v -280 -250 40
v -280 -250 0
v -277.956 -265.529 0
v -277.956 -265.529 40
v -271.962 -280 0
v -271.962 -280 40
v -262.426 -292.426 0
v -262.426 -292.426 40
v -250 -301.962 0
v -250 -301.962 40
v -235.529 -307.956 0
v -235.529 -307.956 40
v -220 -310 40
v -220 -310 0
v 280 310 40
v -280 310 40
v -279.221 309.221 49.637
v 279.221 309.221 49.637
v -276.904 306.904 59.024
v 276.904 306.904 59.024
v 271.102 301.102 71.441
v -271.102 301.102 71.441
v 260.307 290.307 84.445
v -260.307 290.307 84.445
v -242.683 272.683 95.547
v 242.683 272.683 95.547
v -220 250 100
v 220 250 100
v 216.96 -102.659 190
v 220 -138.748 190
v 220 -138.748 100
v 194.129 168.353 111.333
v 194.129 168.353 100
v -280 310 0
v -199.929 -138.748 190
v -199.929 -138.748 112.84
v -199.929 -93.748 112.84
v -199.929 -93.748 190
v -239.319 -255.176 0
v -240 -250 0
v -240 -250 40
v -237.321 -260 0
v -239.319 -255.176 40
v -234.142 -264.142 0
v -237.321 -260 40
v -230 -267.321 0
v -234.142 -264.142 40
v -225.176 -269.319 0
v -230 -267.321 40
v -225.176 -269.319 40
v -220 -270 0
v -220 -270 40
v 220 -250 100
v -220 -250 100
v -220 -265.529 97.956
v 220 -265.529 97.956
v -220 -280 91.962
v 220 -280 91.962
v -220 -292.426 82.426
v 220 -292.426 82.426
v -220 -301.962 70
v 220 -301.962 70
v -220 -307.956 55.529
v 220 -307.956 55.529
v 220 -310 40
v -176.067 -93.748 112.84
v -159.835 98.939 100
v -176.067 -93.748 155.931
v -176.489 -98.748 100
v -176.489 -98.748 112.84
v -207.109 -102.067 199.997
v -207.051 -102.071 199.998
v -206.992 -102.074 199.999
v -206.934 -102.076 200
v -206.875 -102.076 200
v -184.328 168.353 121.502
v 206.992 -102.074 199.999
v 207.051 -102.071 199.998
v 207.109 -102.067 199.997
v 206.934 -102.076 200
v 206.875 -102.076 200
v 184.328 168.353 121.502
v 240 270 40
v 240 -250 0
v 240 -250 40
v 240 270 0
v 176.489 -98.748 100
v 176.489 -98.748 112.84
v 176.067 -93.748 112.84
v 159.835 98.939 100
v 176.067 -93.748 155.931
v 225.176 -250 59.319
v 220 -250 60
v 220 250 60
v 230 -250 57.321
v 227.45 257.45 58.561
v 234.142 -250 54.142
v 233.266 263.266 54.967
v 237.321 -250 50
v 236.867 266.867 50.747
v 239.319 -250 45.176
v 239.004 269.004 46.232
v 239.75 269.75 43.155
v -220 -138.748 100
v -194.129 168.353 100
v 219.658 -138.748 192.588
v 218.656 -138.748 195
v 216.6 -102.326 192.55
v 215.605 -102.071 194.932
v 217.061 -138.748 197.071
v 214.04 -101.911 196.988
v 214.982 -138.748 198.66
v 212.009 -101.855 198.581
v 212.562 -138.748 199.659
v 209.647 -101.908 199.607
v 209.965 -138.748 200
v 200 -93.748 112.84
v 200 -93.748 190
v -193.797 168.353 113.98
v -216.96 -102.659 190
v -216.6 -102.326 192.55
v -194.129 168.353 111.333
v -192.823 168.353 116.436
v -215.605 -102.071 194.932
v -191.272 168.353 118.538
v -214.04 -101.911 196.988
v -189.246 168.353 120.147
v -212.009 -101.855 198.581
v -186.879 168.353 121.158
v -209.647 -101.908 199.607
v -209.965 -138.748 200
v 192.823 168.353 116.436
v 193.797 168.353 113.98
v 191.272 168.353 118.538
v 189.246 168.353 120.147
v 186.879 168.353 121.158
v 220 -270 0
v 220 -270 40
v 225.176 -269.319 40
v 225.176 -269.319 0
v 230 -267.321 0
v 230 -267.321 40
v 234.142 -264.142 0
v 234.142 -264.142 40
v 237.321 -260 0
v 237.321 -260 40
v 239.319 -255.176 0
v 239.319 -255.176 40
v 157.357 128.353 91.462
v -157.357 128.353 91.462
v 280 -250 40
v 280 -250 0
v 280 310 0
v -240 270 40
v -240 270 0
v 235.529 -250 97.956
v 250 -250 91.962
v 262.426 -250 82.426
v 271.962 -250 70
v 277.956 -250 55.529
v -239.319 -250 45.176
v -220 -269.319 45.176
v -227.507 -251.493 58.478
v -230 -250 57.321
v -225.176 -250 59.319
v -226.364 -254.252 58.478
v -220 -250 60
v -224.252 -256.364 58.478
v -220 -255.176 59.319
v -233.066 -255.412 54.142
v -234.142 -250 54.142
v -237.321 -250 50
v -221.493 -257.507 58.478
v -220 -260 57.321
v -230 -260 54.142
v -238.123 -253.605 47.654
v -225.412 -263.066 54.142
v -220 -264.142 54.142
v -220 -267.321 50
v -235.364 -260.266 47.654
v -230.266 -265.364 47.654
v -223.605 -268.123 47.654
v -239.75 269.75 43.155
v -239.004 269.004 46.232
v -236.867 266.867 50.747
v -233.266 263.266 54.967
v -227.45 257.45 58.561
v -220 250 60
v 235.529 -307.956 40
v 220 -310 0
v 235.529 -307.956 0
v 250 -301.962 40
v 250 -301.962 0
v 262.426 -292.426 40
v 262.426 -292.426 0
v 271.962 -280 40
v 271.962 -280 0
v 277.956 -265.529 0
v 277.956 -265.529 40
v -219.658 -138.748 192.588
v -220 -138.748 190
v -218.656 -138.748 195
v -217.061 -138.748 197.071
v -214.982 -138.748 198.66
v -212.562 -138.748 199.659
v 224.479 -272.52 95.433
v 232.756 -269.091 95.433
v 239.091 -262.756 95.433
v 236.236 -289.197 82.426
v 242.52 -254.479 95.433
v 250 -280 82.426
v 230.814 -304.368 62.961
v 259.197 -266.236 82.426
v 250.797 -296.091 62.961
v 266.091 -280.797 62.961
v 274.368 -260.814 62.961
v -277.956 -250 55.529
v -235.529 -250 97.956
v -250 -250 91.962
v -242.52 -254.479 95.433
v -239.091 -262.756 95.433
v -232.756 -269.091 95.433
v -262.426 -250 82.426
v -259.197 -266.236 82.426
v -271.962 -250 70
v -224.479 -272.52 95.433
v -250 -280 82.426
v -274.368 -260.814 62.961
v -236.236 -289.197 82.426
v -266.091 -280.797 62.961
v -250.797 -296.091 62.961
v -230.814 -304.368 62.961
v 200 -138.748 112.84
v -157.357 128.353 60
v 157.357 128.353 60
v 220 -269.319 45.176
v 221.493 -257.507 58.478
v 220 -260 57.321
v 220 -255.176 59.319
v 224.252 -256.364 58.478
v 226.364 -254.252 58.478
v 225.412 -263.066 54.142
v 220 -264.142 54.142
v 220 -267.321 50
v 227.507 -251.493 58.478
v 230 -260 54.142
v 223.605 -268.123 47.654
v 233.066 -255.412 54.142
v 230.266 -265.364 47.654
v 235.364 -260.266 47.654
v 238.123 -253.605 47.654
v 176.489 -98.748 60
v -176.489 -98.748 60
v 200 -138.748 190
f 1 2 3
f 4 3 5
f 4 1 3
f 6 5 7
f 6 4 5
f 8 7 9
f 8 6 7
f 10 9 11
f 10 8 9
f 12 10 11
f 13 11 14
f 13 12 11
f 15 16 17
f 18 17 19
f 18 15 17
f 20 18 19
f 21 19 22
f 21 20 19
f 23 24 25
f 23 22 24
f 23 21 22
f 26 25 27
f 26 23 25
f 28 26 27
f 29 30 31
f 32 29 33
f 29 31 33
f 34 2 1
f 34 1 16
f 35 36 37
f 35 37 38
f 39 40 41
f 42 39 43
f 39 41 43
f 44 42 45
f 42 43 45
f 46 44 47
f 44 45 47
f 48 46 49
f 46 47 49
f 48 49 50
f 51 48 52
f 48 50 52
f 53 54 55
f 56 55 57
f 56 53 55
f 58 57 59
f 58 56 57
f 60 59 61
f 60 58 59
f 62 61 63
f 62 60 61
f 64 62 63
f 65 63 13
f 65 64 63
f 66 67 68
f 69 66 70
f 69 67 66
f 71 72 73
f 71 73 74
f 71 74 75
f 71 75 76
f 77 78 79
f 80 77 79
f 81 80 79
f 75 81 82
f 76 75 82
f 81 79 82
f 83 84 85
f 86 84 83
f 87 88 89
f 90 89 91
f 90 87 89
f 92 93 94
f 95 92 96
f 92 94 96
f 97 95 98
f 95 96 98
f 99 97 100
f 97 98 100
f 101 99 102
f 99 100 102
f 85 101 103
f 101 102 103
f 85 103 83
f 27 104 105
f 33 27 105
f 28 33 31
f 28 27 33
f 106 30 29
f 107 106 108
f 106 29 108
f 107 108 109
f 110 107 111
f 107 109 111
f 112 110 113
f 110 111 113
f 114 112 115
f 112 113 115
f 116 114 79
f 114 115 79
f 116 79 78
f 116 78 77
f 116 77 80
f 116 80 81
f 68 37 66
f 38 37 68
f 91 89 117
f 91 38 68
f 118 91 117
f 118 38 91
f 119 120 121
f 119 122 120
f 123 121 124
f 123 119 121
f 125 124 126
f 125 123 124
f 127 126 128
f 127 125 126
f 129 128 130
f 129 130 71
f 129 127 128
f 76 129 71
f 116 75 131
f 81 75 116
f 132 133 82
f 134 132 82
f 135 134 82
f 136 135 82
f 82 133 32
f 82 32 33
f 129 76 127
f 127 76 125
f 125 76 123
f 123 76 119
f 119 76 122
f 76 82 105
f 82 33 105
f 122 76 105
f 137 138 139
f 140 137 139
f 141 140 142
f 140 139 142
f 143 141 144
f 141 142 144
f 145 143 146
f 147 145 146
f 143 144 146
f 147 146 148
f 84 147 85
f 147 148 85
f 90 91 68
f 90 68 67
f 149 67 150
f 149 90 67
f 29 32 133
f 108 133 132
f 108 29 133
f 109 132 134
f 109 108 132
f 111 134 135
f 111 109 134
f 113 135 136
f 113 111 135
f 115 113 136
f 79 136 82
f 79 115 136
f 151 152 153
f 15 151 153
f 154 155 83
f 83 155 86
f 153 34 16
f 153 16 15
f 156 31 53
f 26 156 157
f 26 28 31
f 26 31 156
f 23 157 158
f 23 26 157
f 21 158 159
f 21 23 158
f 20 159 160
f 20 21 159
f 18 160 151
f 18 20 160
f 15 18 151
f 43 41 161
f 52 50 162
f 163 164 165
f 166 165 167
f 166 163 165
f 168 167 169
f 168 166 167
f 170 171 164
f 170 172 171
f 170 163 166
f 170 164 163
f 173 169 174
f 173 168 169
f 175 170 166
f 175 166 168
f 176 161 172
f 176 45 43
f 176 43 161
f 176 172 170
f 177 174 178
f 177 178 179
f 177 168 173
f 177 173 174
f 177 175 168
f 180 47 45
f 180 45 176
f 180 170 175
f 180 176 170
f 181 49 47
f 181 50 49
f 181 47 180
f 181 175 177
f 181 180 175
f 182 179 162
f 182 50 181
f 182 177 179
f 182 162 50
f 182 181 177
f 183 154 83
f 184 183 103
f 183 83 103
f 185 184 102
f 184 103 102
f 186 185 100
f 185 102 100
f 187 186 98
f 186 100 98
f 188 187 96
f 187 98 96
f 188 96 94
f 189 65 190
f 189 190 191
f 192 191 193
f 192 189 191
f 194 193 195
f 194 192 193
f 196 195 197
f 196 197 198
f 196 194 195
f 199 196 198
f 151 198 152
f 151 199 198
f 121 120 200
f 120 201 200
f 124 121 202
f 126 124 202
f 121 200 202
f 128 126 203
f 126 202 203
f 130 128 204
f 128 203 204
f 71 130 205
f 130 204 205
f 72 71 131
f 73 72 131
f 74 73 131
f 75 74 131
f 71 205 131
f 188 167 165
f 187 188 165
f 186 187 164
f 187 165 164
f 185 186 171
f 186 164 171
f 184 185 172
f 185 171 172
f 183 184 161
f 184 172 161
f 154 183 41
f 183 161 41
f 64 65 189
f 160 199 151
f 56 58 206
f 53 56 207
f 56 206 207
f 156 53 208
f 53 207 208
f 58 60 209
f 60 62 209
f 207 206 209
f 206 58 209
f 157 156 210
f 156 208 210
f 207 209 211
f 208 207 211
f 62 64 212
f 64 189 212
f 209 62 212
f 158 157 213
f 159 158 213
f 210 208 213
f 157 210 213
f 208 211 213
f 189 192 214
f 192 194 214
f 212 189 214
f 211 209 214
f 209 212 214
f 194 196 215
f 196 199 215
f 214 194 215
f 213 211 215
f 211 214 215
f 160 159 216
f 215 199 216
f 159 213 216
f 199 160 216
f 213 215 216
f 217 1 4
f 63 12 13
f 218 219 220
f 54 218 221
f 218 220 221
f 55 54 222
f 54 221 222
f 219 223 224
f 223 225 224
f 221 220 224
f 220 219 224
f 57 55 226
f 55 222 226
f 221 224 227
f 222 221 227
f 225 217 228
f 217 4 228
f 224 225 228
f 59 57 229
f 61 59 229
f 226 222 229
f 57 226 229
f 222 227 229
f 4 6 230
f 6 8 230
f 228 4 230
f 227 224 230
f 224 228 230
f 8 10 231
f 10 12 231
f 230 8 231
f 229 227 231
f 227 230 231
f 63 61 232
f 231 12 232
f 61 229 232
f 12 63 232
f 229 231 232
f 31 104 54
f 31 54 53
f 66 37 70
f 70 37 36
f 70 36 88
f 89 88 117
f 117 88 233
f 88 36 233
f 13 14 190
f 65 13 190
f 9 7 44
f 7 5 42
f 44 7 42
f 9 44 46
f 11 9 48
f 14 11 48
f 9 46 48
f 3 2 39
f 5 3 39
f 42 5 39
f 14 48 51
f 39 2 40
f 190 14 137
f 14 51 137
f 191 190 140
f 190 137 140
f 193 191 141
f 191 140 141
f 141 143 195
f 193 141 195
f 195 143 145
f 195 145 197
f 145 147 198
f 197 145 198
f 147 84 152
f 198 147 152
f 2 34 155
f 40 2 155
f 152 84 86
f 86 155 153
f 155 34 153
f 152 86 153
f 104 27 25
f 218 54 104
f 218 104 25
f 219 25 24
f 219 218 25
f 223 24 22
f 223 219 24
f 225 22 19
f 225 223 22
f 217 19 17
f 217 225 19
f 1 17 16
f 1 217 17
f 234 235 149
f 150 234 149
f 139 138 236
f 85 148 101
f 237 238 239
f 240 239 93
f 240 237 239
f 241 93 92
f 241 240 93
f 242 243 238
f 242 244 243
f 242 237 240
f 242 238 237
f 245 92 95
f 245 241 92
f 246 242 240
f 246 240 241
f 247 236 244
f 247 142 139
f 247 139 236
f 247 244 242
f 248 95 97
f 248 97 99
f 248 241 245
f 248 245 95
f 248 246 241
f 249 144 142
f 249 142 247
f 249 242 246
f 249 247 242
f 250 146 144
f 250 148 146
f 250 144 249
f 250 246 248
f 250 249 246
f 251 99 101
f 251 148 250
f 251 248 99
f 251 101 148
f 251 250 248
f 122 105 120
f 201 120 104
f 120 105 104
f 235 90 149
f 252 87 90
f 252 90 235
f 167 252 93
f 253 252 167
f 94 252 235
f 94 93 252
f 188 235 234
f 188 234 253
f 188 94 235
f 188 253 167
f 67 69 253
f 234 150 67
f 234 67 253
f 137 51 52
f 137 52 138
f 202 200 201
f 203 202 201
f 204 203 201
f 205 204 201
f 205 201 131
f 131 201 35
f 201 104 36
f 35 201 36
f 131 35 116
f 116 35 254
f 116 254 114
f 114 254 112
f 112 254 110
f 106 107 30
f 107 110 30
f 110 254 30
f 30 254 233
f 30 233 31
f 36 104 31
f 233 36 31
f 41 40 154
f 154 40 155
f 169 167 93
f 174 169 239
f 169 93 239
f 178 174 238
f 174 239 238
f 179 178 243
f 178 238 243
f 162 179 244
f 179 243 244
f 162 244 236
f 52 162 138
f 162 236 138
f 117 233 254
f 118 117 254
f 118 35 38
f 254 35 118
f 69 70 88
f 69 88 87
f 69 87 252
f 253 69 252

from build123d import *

# Parameters (mm, degrees)
F0_W         = 560
F0_H         = 620
F1_DEPTH     = 100
F2_R         = 60
F3_R         = 60
F5_DEPTH     = 100
F7_DEPTH     = 560.001
F8_R         = 10
F10_T        = 40
F10_T3_DEPTH = 520
F10_T5_DEPTH = 388.1889053137
F10_T7_DEPTH = 388.1889053137
F10_T9_DEPTH = 468.2577419281
F9_W         = 399.9291565789
F9_H         = 77.1599882841
F11_DEPTH    = 45


# Not quite as in the source:
# - a shell that OpenCascade refuses in one call is made with other operations: the cavity is built on its own and cut out


with BuildPart() as f1:
    # F0 (on Top) → F1 (new body)
    with BuildSketch(Plane.XY):
        Rectangle(F0_W, F0_H)
    extrude(amount=F1_DEPTH)

    # F2
    f2_edges = [f1.edges().sort_by_distance(p)[0] for p in [
        (280, -310, 50),
        (-280, -310, 50),
    ]]
    fillet(f2_edges, radius=F2_R)

    # F3
    f3_edges = [f1.edges().sort_by_distance(p)[0] for p in [
        (0, -310, 100),
        (-262.426407, -292.426407, 100),
        (262.426407, -292.426407, 100),
        (-280, 30, 100),
        (280, 30, 100),
        (0, 310, 100),
    ]]
    fillet(f3_edges, radius=F3_R)

    # F4 (on face) → F5 (join)
    with BuildSketch(Plane.XY.offset(100)):
        Polygon((-194.1288709641, 168.3533191681), (-220, -138.7477815151), (0, -138.7477815151), (220, -138.7477815151), (194.1288709641, 168.3533191681), (0, 168.3533191681), align=None)
    extrude(amount=F5_DEPTH)

    # F6 (on face) → F7 (cut, through all)
    with BuildSketch(Plane.YZ.offset(280)):
        Polygon((261.031751243, 237.4019711016), (-149.0081892093, 213.623028462), (222.8016257286, 105.6972444057), align=None)
    extrude(amount=-F7_DEPTH, mode=Mode.SUBTRACT)

    # F8
    f8_edges = [f1.edges().sort_by_distance(p)[0] for p in [
        (218.455336, -120.411972, 200),
        (205.519771, 33.138578, 160.751017),
        (-218.455336, -120.411972, 200),
        (-205.519771, 33.138578, 160.751017),
    ]]
    fillet(f8_edges, radius=F8_R)

    # F10: shell of thickness 40, made by hand


with BuildPart() as f10_core1:
    # F10_t2: copy of F1
    add(f1.part)

    # the walls: a layer under each face that stays
    f10_faces = [f10_core1.faces().sort_by_distance(p)[0] for p in [
        (0, -138.7477815151, 150),
        (-207.064435482, 14.8027688265, 145),
        (0, -194.3738907576, 100),
        (0, -120.411972418, 200),
        (207.064435482, 14.8027688265, 145),
        (-146.6666666667, 185.2087030808, 100),
        (0, 168.3533191681, 110.7510173791),
        (0, 33.1385779236, 160.7510173791),
        (262.4264068712, 30, 82.4264068712),
        (0, -292.4264068712, 82.4264068712),
        (-262.4264068712, 30, 82.4264068712),
        (0, 292.4264068712, 82.4264068712),
        (250, -280, 82.4264068712),
        (280, 30, 20),
        (-250, -280, 82.4264068712),
        (0, -310, 20),
        (-280, 30, 20),
        (0, 310, 20),
        (262.4264068712, -292.4264068712, 20),
        (-262.4264068712, -292.4264068712, 20),
    ]]
    thicken(f10_faces, amount=-F10_T, mode=Mode.SUBTRACT)

    # F10_s4 → F10_t3 (cut)
    with BuildSketch(Plane.YZ.offset(-260)):
        Polygon((-139.1477815151, 100.4), (-98.7477815151, 100), (-98.7477815151, 60), (-138.7477815151, 60), align=None)
    extrude(amount=F10_T3_DEPTH, mode=Mode.SUBTRACT)

    # F10_s6 → F10_t5 (cut)
    with BuildSketch(Plane(origin=(16.0724766165, 190.7870063494, 0), x_dir=(0, 0, 1), z_dir=(-0.0839456859, -0.9964703316, 0))):
        Polygon((100.4, 207.976195276), (100, 167.576195276), (60, 167.576195276), (60, 207.576195276), align=None)
    extrude(amount=F10_T5_DEPTH, mode=Mode.SUBTRACT)

    # F10_s8 → F10_t7 (cut)
    with BuildSketch(Plane(origin=(16.5143072895, -196.0317208644, 0), x_dir=(0, 0, 1), z_dir=(-0.0839456859, 0.9964703316, 0))):
        Polygon((100.4, 207.976195276), (100, 167.576195276), (60, 167.576195276), (60, 207.576195276), align=None)
    extrude(amount=F10_T7_DEPTH, mode=Mode.SUBTRACT)

    # F10_s10 → F10_t9 (cut)
    with BuildSketch(Plane.YZ.offset(-234.1288709641)):
        Polygon((168.7533191681, 100.4), (168.3533191681, 60), (128.3533191681, 60), (128.3533191681, 100), align=None)
    extrude(amount=F10_T9_DEPTH, mode=Mode.SUBTRACT)


with BuildPart() as f1_1:
    add(f1.part)

    # what is left inside the walls is the cavity
    f10_cavity = [f10_core1.part.solids().sort_by_distance(p)[0] for p in [
        (0, -90, 0.4),
    ]]
    add(f10_cavity, mode=Mode.SUBTRACT)

    # F9 (on face) → F11 (cut)
    with BuildSketch(Plane.XZ.offset(138.7477815151)):
        with Locations((0.0354217106, 151.4200058579)):
            Rectangle(F9_W, F9_H)
    extrude(amount=-F11_DEPTH, mode=Mode.SUBTRACT)


solid = f1_1.part
